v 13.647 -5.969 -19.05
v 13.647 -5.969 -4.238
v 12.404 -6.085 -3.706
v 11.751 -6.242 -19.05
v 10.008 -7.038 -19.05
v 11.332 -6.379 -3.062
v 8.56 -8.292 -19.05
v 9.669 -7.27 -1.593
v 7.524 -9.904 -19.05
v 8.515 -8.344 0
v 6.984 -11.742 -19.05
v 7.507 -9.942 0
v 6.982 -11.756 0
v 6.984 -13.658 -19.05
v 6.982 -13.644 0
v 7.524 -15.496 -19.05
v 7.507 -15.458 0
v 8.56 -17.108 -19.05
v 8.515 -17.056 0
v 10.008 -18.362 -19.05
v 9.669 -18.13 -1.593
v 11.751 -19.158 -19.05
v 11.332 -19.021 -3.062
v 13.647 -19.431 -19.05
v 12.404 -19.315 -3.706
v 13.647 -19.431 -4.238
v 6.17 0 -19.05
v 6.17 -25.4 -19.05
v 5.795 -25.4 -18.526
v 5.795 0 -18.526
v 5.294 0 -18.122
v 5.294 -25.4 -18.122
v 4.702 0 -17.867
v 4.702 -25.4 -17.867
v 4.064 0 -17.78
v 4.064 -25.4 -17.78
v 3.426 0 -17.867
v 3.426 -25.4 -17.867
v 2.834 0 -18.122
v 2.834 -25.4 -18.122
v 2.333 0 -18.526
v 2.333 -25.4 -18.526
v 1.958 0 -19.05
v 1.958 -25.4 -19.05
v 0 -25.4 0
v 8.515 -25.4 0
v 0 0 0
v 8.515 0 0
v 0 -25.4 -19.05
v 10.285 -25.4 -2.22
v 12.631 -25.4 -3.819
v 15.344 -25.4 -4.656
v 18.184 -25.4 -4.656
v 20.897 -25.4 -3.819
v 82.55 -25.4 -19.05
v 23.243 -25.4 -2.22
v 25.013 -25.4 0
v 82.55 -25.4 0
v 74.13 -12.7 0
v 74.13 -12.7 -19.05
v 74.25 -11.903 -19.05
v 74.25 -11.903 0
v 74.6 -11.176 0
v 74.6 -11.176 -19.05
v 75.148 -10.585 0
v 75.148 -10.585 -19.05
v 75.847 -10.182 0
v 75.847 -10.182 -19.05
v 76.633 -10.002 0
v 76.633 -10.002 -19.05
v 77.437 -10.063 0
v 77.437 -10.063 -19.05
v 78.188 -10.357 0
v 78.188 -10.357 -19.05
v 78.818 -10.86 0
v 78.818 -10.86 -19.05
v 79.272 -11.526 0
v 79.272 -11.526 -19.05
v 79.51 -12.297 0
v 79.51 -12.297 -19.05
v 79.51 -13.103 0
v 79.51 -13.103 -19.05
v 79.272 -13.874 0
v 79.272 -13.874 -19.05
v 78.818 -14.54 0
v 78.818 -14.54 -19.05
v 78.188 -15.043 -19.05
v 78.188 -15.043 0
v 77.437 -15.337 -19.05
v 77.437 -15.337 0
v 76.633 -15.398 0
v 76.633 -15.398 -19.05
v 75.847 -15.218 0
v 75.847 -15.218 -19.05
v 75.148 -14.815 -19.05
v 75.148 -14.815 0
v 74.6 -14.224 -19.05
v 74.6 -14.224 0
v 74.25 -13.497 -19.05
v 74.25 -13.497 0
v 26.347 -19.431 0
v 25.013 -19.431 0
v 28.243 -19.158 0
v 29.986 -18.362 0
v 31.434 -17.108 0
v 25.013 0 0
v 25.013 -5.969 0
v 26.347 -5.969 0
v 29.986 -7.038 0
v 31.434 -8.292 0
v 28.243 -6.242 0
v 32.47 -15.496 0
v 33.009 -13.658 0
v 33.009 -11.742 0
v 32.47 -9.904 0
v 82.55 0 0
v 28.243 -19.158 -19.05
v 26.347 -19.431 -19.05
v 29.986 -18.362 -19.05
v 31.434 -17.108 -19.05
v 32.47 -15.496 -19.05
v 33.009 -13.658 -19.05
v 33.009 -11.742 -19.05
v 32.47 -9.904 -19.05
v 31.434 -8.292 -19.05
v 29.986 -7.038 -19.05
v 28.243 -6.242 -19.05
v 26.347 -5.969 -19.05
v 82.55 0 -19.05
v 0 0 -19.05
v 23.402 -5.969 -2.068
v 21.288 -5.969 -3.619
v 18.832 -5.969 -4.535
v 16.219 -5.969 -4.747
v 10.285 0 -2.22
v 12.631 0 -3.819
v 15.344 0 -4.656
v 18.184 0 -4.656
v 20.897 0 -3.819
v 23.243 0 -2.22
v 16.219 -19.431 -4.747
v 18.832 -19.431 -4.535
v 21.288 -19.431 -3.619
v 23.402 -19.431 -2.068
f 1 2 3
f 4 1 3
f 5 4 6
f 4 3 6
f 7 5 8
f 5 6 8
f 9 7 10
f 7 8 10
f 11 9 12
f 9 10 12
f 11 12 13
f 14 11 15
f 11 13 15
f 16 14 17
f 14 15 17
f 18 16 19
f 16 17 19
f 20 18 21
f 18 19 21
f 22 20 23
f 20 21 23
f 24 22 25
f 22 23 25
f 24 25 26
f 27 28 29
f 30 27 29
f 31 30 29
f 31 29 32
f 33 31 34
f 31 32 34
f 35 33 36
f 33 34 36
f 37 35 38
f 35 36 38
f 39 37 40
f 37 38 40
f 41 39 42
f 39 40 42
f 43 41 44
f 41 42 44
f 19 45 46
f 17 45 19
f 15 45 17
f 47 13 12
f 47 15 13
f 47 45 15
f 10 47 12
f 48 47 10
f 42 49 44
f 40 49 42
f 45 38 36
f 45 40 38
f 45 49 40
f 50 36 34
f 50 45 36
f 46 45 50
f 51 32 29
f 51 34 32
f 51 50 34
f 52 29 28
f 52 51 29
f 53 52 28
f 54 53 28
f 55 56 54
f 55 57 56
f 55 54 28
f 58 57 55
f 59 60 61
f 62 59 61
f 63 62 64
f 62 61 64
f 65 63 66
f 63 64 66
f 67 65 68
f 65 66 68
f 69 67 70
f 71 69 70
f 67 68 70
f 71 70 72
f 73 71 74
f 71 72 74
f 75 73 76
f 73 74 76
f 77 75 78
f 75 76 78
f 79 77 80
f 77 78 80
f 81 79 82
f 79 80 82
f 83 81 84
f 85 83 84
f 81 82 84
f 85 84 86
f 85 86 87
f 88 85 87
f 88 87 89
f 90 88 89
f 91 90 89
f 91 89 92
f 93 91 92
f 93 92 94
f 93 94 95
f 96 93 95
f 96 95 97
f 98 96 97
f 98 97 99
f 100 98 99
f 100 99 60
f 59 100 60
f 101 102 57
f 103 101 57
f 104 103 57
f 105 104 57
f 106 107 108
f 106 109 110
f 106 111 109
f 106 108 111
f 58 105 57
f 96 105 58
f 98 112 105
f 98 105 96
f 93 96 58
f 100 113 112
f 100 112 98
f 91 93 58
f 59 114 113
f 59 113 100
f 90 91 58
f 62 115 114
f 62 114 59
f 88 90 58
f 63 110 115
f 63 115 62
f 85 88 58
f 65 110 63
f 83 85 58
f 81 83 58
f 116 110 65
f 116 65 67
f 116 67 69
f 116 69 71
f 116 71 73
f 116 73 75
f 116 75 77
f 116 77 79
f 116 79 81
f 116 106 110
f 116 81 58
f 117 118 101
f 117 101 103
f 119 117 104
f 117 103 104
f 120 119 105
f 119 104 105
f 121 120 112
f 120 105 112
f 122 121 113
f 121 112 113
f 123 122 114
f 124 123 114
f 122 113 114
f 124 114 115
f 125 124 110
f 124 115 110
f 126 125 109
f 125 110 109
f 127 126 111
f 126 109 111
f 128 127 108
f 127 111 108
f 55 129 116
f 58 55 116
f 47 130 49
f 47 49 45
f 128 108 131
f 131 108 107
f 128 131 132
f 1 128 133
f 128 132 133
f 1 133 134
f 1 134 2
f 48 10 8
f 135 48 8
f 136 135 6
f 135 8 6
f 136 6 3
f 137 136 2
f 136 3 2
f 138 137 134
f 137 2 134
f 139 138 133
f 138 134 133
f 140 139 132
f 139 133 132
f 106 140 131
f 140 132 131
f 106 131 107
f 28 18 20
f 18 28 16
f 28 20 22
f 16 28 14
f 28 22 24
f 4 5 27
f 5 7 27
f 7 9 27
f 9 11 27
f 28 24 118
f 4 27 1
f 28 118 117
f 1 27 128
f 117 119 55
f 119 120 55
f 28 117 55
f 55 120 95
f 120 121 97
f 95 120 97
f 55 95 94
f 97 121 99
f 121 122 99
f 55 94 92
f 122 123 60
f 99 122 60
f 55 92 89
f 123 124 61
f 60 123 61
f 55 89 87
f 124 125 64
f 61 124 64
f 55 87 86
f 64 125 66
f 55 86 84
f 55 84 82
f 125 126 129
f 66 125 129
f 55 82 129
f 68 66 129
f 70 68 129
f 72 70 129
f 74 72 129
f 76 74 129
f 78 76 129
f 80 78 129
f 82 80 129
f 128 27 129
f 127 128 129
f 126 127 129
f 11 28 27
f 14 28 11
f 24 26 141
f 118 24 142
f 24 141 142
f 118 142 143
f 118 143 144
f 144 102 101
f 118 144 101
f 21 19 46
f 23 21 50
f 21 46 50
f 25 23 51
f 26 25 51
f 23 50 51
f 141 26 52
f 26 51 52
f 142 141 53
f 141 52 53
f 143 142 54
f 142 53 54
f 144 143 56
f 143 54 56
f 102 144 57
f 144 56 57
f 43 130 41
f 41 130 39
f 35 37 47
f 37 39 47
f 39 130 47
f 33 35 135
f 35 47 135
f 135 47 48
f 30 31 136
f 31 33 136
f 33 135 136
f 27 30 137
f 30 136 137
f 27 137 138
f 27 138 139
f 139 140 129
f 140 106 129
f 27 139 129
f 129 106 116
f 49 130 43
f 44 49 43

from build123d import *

# Parameters (mm, degrees)
F0_W     = 82.55
F0_H     = 19.05
F1_DEPTH = 25.4
F3_DEPTH = 25.4
F4_R     = 9.525
F5_DEPTH = 25.4
F6_R     = 2.38125
F7_DEPTH = 25.4
F9_D     = 5.4102


with BuildPart() as f1:
    # F0 (on Front) → F1 (new body)
    with BuildSketch(Plane.XZ):
        with Locations((41.275, -9.525)):
            Rectangle(F0_W, F0_H)
    extrude(amount=F1_DEPTH)

    # F2 (on face) → F3 (cut)
    with BuildSketch(Plane.XY):
        with BuildLine():
            Line((26.3469211429, -5.969), (13.6469211429, -5.969))
            ThreePointArc((13.6469211429, -5.969), (6.9159211429, -12.7), (13.6469211429, -19.431))
            Line((13.6469211429, -19.431), (26.3469211429, -19.431))
            ThreePointArc((26.3469211429, -19.431), (33.0779211429, -12.7), (26.3469211429, -5.969))
        make_face()
    extrude(amount=-F3_DEPTH, mode=Mode.SUBTRACT)

    # F4 (on face) → F5 (cut)
    with BuildSketch(Plane.XZ.offset(25.4)):
        with Locations((16.764, 4.7625)):
            Circle(F4_R)
    extrude(amount=-F5_DEPTH, mode=Mode.SUBTRACT)

    # F6 (on face) → F7 (cut)
    with BuildSketch(Plane.XZ.offset(25.4)):
        with Locations((4.064, -20.16125)):
            Circle(F6_R)
    extrude(amount=-F7_DEPTH, mode=Mode.SUBTRACT)

    # F9 (through all)
    with Locations(Plane.XY):
        with Locations((76.835, -12.7)):
            Hole(F9_D / 2)


solid = f1.part
